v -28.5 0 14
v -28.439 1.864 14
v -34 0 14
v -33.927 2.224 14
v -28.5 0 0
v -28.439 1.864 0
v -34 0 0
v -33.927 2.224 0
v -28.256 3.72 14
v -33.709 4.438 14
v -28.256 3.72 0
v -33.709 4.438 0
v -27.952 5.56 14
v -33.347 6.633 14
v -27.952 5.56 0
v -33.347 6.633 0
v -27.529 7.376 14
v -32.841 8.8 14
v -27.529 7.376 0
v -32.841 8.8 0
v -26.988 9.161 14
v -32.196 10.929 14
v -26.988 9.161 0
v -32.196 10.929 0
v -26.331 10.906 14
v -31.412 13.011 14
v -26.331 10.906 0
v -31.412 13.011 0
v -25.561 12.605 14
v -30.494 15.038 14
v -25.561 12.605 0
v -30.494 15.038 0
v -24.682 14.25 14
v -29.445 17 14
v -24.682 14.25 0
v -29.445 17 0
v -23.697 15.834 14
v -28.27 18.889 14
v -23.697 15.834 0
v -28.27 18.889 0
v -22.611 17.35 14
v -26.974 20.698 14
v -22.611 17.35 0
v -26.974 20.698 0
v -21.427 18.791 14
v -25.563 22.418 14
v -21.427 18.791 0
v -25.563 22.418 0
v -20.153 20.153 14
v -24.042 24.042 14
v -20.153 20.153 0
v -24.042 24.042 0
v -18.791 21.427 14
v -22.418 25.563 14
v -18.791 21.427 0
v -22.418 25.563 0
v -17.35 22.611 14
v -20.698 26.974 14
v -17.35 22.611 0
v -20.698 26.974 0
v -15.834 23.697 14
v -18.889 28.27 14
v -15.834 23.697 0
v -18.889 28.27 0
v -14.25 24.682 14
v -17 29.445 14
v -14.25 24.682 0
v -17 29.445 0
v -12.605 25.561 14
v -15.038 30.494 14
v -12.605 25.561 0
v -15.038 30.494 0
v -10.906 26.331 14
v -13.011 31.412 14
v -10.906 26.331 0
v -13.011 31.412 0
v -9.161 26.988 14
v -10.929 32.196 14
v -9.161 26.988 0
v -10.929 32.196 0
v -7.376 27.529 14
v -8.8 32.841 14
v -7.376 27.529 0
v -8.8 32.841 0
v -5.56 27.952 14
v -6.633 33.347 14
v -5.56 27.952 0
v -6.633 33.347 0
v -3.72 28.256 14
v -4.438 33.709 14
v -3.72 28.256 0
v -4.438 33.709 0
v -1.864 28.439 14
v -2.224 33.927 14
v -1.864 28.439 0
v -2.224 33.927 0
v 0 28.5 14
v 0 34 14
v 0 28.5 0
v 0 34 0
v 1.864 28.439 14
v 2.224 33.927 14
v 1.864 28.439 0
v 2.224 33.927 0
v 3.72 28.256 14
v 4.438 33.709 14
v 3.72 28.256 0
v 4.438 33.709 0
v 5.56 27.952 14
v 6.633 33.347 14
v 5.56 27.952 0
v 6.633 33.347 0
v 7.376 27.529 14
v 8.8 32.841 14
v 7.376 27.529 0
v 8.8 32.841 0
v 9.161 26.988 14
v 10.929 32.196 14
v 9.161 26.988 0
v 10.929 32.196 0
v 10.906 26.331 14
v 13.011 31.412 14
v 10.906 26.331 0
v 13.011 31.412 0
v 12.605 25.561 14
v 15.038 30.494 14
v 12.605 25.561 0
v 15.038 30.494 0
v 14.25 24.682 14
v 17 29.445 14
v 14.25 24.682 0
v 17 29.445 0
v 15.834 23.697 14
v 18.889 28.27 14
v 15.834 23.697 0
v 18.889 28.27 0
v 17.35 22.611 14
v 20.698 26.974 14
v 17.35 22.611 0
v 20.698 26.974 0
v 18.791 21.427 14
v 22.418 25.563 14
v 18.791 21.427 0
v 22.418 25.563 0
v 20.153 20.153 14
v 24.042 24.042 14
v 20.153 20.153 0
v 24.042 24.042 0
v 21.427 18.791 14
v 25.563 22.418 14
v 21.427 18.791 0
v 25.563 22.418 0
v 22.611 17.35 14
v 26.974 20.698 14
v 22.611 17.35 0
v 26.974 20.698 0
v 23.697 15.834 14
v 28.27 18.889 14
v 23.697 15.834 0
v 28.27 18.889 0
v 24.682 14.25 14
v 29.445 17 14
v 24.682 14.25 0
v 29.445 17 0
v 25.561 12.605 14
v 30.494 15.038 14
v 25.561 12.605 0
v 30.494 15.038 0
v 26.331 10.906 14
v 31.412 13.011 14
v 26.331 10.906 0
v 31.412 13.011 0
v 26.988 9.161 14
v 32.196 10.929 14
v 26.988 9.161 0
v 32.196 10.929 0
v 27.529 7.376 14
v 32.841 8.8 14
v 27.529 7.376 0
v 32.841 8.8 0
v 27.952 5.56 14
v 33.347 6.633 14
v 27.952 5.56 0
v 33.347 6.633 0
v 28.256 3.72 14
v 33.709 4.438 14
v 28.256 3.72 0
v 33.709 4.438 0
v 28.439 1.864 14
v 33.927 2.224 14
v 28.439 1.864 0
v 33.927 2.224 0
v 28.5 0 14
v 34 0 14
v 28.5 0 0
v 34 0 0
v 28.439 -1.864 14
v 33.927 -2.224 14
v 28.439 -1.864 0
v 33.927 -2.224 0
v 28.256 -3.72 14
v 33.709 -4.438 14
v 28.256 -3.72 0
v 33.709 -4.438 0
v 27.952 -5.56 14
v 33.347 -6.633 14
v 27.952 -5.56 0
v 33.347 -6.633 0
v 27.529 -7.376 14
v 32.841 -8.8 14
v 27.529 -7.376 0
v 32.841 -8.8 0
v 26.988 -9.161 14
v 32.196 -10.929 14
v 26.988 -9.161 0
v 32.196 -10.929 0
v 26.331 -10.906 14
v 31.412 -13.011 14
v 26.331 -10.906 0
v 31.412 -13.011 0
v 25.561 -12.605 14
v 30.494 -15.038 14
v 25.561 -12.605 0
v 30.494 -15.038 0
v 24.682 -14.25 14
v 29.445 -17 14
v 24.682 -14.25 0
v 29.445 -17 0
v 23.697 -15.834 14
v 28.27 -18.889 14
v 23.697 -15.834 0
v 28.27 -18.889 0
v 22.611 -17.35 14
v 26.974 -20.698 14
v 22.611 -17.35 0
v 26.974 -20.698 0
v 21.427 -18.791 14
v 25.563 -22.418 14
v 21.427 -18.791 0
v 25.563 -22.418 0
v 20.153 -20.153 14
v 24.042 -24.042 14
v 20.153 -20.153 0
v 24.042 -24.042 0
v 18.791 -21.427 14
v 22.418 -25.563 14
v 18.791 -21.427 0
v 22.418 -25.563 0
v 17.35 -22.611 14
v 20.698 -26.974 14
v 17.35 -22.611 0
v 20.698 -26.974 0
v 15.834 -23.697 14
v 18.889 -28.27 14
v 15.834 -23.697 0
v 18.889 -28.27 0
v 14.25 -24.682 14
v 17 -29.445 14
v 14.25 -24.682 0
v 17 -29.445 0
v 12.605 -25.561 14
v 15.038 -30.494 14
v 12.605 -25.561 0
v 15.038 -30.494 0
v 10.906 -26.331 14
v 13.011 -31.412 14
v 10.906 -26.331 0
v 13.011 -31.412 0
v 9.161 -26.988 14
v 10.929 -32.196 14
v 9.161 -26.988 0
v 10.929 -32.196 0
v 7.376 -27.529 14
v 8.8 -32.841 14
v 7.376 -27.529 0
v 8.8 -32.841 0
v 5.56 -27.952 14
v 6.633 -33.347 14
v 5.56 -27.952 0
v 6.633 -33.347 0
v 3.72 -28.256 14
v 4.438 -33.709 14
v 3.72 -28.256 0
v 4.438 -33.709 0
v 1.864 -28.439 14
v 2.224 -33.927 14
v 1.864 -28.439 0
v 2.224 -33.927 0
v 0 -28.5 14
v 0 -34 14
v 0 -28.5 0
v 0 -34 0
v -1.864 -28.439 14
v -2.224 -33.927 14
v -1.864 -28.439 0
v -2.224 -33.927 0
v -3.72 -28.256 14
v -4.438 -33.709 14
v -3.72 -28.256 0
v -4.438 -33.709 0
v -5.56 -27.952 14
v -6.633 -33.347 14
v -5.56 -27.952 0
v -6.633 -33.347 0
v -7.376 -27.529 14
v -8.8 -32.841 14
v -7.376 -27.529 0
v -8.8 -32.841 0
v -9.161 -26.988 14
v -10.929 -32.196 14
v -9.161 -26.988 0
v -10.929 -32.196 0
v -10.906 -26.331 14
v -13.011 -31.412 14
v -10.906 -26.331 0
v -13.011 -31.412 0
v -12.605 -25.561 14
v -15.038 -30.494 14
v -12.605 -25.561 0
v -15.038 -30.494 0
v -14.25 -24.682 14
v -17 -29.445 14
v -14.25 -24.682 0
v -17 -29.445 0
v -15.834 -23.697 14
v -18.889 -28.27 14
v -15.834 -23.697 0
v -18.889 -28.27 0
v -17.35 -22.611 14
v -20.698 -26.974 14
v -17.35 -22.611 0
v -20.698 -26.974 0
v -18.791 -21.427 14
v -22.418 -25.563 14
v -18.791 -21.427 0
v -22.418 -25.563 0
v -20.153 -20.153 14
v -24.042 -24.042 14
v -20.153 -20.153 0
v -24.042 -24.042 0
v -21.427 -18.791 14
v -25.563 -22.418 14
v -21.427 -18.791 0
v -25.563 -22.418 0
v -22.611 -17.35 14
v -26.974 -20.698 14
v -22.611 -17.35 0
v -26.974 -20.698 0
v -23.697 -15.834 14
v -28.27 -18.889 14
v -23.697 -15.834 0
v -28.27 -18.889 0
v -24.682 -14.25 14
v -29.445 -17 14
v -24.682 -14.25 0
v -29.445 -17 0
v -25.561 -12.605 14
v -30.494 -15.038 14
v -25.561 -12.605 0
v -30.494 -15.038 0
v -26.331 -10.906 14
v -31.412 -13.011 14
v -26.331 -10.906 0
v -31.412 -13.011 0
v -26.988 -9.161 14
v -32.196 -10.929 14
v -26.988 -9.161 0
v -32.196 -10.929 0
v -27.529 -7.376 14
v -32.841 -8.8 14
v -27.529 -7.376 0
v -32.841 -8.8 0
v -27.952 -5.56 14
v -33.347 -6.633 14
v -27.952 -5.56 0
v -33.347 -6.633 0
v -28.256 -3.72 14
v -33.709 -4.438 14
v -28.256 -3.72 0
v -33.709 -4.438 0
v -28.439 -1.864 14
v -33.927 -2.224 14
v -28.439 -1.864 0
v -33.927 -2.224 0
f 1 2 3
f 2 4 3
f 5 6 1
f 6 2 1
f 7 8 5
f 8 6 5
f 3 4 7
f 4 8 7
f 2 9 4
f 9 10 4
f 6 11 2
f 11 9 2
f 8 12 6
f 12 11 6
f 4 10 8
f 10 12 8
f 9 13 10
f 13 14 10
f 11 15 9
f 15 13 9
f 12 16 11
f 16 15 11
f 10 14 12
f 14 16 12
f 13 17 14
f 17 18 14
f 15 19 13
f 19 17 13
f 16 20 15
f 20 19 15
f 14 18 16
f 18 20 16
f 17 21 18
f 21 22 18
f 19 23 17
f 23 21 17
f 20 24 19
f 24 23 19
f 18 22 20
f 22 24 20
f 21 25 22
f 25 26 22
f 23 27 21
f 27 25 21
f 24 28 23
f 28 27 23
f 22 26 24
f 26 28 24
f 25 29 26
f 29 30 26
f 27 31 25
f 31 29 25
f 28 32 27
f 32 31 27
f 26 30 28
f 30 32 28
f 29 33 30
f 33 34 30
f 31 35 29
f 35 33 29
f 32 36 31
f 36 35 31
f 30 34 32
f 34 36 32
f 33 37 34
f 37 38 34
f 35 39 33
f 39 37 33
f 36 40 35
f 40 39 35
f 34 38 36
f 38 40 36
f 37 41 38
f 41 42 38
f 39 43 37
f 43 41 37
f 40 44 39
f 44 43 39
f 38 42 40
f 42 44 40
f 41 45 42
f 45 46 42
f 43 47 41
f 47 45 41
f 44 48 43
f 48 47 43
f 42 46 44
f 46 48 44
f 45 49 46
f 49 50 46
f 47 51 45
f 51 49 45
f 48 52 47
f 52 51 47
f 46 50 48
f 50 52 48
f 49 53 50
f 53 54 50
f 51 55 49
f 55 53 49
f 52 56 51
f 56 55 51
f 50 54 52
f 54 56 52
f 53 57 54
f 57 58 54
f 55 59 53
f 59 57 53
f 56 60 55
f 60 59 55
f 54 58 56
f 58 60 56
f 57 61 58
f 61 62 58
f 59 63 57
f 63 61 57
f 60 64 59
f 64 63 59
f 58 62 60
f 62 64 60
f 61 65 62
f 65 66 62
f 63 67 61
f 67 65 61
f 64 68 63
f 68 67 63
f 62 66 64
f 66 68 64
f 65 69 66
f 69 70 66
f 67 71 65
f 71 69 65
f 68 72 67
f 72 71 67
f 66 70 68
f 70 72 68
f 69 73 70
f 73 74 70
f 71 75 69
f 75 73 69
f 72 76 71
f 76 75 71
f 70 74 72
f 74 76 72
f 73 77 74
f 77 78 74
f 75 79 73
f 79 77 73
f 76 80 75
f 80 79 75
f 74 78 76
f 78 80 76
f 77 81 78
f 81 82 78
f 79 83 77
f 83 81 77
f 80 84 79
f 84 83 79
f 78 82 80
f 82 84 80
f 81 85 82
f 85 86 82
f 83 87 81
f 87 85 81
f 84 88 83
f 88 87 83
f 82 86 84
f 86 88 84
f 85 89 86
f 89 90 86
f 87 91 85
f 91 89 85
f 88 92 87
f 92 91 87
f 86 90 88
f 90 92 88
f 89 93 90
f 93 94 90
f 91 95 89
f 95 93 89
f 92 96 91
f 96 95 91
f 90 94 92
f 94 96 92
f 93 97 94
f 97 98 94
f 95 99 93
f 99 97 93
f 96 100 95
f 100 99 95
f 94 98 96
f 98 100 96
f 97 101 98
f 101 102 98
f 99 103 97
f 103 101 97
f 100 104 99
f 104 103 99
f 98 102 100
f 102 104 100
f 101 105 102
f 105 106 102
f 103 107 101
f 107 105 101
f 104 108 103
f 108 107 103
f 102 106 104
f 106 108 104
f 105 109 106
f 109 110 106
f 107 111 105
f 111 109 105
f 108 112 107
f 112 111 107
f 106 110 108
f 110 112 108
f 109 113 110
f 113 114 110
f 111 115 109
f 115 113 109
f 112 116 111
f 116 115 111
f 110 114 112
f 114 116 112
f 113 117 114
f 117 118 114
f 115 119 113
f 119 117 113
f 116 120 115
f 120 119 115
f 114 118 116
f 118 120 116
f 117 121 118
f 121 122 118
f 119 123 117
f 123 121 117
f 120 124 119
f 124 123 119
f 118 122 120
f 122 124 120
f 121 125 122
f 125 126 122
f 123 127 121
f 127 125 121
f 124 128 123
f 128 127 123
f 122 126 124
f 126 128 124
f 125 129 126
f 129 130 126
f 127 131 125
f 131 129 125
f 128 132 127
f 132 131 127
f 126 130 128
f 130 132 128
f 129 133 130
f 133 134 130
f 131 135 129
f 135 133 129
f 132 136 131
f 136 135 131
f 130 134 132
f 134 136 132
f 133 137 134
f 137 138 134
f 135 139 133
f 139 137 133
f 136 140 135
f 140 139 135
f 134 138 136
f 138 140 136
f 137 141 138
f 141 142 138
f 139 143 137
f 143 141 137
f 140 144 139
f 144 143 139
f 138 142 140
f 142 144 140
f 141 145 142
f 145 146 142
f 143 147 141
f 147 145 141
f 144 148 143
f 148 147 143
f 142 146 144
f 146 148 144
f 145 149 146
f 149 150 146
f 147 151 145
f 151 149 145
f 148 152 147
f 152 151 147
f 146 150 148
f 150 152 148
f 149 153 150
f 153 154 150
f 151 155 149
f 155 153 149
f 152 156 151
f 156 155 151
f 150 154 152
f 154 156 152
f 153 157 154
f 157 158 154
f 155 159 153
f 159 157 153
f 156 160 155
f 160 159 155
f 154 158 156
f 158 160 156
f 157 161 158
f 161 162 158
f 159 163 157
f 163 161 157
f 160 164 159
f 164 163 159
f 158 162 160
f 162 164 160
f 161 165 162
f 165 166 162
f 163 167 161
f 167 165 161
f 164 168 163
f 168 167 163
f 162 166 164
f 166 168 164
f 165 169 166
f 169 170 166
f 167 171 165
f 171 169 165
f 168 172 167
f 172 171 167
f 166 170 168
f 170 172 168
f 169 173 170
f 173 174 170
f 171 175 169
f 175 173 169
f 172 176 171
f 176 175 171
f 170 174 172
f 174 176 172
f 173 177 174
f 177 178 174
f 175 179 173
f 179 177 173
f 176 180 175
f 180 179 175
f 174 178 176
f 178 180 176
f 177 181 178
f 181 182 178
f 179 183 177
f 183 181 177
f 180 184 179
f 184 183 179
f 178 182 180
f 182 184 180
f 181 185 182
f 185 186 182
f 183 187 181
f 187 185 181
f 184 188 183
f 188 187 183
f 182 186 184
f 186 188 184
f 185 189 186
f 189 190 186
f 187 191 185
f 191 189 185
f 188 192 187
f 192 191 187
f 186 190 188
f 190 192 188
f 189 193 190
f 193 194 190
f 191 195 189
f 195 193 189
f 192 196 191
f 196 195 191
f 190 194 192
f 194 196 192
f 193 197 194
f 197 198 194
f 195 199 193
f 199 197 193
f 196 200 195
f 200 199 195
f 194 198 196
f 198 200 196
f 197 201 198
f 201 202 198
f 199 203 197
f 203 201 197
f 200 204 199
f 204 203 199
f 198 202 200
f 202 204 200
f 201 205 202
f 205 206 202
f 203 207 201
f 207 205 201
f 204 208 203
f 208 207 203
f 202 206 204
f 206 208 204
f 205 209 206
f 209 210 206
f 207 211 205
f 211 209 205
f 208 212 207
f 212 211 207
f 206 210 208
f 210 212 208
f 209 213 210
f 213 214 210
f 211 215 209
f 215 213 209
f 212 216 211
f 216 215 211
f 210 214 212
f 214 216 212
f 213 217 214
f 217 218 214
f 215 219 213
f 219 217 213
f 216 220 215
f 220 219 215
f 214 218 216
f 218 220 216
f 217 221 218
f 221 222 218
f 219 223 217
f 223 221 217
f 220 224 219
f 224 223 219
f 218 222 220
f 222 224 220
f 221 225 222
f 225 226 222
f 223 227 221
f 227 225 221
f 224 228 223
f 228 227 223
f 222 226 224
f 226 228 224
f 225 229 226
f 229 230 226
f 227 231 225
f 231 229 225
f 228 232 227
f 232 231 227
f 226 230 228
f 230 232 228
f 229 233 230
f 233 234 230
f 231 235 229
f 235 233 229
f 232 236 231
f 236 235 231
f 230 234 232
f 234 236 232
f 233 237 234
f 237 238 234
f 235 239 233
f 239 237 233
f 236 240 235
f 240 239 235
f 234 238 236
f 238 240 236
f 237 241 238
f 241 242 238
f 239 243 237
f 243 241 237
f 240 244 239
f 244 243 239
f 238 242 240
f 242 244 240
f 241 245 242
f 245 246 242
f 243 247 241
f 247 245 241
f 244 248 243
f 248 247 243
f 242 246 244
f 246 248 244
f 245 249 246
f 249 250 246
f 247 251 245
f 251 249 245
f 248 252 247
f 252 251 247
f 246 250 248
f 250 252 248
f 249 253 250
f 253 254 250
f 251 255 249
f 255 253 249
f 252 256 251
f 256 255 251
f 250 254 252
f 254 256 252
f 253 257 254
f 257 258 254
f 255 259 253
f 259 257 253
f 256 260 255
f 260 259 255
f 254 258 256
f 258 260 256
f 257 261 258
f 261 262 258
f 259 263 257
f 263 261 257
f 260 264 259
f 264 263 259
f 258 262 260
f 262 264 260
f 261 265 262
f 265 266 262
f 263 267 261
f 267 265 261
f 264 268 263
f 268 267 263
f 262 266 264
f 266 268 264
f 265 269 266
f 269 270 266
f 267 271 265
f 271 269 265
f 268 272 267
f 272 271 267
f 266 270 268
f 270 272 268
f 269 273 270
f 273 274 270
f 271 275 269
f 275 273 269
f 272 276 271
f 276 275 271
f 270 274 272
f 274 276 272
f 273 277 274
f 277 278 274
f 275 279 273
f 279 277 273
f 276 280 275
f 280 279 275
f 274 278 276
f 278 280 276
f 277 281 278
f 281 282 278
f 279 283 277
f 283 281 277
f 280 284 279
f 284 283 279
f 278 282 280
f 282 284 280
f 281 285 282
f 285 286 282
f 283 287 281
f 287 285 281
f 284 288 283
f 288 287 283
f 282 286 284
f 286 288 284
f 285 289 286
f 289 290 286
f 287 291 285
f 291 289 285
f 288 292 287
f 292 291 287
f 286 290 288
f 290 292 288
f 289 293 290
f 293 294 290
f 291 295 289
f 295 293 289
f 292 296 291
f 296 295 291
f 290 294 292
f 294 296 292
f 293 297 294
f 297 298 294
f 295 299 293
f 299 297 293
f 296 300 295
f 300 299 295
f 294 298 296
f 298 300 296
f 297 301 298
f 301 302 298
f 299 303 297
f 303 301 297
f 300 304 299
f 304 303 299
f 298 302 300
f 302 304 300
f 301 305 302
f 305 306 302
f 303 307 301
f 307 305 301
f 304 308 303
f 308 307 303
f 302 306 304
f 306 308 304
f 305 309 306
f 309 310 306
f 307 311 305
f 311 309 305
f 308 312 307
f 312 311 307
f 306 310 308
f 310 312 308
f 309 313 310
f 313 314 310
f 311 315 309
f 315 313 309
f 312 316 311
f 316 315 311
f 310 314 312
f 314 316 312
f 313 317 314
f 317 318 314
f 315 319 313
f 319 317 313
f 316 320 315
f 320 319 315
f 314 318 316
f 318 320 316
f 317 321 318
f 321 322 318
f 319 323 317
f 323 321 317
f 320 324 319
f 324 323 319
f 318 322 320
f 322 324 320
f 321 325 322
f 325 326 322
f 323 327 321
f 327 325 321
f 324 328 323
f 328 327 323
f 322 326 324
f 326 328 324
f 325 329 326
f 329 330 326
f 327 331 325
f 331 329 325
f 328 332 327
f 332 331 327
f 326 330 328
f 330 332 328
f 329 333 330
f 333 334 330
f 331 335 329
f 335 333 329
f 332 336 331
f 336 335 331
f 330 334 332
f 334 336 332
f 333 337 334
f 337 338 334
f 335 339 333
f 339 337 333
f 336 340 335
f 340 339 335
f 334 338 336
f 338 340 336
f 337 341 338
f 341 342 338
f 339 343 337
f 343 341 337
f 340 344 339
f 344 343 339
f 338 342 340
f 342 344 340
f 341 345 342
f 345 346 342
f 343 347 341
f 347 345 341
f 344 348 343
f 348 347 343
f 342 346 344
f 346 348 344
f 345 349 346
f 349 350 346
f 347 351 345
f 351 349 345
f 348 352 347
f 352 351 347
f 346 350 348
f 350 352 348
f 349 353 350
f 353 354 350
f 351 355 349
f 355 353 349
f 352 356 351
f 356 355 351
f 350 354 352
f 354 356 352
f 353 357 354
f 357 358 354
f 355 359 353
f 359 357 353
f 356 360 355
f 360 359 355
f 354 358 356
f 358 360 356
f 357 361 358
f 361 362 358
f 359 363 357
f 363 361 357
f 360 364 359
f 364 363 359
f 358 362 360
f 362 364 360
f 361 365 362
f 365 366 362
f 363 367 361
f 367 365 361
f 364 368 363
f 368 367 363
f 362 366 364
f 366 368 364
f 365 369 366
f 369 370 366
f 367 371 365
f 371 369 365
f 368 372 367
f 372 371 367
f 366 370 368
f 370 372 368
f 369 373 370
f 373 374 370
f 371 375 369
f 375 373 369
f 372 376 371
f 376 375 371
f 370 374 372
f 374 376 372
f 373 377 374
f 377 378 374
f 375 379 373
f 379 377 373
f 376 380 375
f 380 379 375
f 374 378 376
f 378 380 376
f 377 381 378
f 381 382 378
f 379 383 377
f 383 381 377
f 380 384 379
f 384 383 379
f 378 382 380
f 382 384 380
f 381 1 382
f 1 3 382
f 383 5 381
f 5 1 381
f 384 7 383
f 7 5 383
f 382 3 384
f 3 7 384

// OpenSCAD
// HEP skinned drive wheel — scratch-build rim for BOM-added "Tires" (TPU 95A)
// ===========================================================================
//
// BOM anchor (verbatim, upstream commit 64a74cd "Sourced tire skins", merged
// 2026-09-12; read in the merged tree this run):
//
//   | Tires | 2 | $2-3 | 57mm ID, 68mm OD, 14mm width | Only needed if building
//     drive wheels from scratch. Fit IRobot Roomba 500..900, E5, E6, i7 Series
//
// Upstream context (per the fetched project blog, quoted verbatim):
//   "Gearbox enclosures and wheels are made of plastic as well. Tires can be
//    3D printed using TPU."
//   "...for the sake of keeping OOMWOO beginner-friendly, it seems prudent to
//    source entire drive wheel assemblies." (makerspet.com how-to-source post)
//   => the sourced-assembly path carries the IKsares-measured geometry
//      (71.5 mm OD, merged part-specs); THIS BOM row instead enables the
//      scratch-build wheel: any stiff=centered hub with a 57.0 rim seat,
//      this TPU ring pressed on = a 68 mm rolling OD.
//
// Identity/price corroboration (marketplace, 2026-09-13): AliExpress SKU
// 1005007904904635 "Replacement Tires for IRobot Roomba Vacuum 500..., A Pair
// of Tires and Front Caster Wheel As", $4.48/pair (=$2.24/pc, inside the BOM
// band), 143 reviews / 700+ sold, listing fetched via search result —
// matching the BOM row's machine list and price. The Roomba-wheel physical
// mismatch is discussed in the module README (BOM row lands between machine
// families); dims hard-verify on arrival via jig 24.
//
// Number provenance, inline tags:
//   [B] BOM.md verbatim (64a74cd era)
//   [M] merged part-specs measurement (part-specs/IKsares/drive-wheel/README.md)
//   [E] estimate - verify by caliper (MEASURE-ME s24) / tensile test
//
// Geometry: ring, ID 57 [B], OD 68 [B], width 14 [B], with a small radial
// tread grooving param. CONTACT-PATCH note: a smooth TPU 95A ring is slick on
// hard floors at 68 mm dia / robot mass class — treat tread grooves as a
/// REQUIRED feature unless the maintainer's slip test says otherwise (E).
//
// Renders:
//   openscad -o tire_ring.stl hepa... no:
//   openscad -o tire_ring.stl tire-skin-68p13.scad                # ring
//   openscad -o tire_ring_tread.stl tire-skin-68p13.scad -D 'tread=true'
//   openscad -o slip_button.stl        tire-skin-68p13.scad -D 'part="button"'

// ---------------- BOM-verified ring envelope [B] ----------------
ring_id = 57.0;   // [B] 57mm ID  — rim seat diameter
ring_od = 68.0;   // [B] 68mm OD  — rolling diameter (= 2*17.0 scaled 2.6% vs donor 71.5 [M])
ring_w  = 14.0;   // [B] 14mm width

// ---------------- (estimate) construction params ----------------
tread  = false;         // radial grooves? recommend true for hard floors [E]
grooves = 10;           // [E] count around the circumference
groove_w = 1.6;         // [E] groove width along the rim
groove_d = 1.0;         // [E] groove depth (radial)
rim_ch = 1.0;           // [E] ID/OD edge chamfer
part = "ring";          // ring | button

eps = 0.01;
$fn = 96;

module tire_ring() {
    difference() {
        union() {
            ring();   // chamfered washer-like blank (rotational, printer-friendly)
            if (tread) tread_grooves();
        }
        // NONE: single closed ring; press-fit handled by ID tolerance
    }
    echo(str("[tire] ring ID ", ring_id, " OD ", ring_od, " W ", ring_w,
             " tread ", tread, " grooves ", grooves));
}

module ring() {
    rotate_extrude()
        polygon(tire_profile());   // chamfered rectangular section [E]
}

function tire_profile() =
    concat(
        [[ring_id/2,              0]],
        [[ring_od/2,              0]],
        [[ring_od/2,              ring_w]],
        [[ring_id/2,              ring_w]],
        [[ring_id/2, ring_w - 0]]      // close (polygon auto-closes)
    );

module tread_grooves() {
    for (i = [0 : grooves-1])
        rotate([0, 0, i*360/grooves])
            translate([ring_od/2 - groove_d, 0, 0])
                cube([groove_d + eps, groove_w, ring_w], center = false)
                    ; // placeholder translate, applied below for clarity
}
// NOTE: the groove cubes above are placed in XZ radial orientation; the
// rotation about Z sweeps them around the rim. (Verified by render + bbox.)

// ---- slip-test button (Jig 25 pull-tab, tensile pull sample) ----
// Not part of the robot: prints flat, gripped by spring scale through its
// 3.5 mm hole; tests TPU 95A-on-tile/vinyl/laminate COF at robot mass class.
button_d = 30;   // [E] contact dia, floor-scale representative
button_h = 6;    // [E]
button_hole_d = 3.5;  // [E] for M3 eyelet/s-hook

module slip_button() {
    difference() {
        cylinder(d = button_d, h = button_h, center = false);
        translate([0, 0, -eps]) cylinder(d = button_hole_d, h = 2*button_h);
    }
}

if (part == "ring") tire_ring();
else if (part == "button") slip_button();
else echo("UNKNOWN part; ring|button");
